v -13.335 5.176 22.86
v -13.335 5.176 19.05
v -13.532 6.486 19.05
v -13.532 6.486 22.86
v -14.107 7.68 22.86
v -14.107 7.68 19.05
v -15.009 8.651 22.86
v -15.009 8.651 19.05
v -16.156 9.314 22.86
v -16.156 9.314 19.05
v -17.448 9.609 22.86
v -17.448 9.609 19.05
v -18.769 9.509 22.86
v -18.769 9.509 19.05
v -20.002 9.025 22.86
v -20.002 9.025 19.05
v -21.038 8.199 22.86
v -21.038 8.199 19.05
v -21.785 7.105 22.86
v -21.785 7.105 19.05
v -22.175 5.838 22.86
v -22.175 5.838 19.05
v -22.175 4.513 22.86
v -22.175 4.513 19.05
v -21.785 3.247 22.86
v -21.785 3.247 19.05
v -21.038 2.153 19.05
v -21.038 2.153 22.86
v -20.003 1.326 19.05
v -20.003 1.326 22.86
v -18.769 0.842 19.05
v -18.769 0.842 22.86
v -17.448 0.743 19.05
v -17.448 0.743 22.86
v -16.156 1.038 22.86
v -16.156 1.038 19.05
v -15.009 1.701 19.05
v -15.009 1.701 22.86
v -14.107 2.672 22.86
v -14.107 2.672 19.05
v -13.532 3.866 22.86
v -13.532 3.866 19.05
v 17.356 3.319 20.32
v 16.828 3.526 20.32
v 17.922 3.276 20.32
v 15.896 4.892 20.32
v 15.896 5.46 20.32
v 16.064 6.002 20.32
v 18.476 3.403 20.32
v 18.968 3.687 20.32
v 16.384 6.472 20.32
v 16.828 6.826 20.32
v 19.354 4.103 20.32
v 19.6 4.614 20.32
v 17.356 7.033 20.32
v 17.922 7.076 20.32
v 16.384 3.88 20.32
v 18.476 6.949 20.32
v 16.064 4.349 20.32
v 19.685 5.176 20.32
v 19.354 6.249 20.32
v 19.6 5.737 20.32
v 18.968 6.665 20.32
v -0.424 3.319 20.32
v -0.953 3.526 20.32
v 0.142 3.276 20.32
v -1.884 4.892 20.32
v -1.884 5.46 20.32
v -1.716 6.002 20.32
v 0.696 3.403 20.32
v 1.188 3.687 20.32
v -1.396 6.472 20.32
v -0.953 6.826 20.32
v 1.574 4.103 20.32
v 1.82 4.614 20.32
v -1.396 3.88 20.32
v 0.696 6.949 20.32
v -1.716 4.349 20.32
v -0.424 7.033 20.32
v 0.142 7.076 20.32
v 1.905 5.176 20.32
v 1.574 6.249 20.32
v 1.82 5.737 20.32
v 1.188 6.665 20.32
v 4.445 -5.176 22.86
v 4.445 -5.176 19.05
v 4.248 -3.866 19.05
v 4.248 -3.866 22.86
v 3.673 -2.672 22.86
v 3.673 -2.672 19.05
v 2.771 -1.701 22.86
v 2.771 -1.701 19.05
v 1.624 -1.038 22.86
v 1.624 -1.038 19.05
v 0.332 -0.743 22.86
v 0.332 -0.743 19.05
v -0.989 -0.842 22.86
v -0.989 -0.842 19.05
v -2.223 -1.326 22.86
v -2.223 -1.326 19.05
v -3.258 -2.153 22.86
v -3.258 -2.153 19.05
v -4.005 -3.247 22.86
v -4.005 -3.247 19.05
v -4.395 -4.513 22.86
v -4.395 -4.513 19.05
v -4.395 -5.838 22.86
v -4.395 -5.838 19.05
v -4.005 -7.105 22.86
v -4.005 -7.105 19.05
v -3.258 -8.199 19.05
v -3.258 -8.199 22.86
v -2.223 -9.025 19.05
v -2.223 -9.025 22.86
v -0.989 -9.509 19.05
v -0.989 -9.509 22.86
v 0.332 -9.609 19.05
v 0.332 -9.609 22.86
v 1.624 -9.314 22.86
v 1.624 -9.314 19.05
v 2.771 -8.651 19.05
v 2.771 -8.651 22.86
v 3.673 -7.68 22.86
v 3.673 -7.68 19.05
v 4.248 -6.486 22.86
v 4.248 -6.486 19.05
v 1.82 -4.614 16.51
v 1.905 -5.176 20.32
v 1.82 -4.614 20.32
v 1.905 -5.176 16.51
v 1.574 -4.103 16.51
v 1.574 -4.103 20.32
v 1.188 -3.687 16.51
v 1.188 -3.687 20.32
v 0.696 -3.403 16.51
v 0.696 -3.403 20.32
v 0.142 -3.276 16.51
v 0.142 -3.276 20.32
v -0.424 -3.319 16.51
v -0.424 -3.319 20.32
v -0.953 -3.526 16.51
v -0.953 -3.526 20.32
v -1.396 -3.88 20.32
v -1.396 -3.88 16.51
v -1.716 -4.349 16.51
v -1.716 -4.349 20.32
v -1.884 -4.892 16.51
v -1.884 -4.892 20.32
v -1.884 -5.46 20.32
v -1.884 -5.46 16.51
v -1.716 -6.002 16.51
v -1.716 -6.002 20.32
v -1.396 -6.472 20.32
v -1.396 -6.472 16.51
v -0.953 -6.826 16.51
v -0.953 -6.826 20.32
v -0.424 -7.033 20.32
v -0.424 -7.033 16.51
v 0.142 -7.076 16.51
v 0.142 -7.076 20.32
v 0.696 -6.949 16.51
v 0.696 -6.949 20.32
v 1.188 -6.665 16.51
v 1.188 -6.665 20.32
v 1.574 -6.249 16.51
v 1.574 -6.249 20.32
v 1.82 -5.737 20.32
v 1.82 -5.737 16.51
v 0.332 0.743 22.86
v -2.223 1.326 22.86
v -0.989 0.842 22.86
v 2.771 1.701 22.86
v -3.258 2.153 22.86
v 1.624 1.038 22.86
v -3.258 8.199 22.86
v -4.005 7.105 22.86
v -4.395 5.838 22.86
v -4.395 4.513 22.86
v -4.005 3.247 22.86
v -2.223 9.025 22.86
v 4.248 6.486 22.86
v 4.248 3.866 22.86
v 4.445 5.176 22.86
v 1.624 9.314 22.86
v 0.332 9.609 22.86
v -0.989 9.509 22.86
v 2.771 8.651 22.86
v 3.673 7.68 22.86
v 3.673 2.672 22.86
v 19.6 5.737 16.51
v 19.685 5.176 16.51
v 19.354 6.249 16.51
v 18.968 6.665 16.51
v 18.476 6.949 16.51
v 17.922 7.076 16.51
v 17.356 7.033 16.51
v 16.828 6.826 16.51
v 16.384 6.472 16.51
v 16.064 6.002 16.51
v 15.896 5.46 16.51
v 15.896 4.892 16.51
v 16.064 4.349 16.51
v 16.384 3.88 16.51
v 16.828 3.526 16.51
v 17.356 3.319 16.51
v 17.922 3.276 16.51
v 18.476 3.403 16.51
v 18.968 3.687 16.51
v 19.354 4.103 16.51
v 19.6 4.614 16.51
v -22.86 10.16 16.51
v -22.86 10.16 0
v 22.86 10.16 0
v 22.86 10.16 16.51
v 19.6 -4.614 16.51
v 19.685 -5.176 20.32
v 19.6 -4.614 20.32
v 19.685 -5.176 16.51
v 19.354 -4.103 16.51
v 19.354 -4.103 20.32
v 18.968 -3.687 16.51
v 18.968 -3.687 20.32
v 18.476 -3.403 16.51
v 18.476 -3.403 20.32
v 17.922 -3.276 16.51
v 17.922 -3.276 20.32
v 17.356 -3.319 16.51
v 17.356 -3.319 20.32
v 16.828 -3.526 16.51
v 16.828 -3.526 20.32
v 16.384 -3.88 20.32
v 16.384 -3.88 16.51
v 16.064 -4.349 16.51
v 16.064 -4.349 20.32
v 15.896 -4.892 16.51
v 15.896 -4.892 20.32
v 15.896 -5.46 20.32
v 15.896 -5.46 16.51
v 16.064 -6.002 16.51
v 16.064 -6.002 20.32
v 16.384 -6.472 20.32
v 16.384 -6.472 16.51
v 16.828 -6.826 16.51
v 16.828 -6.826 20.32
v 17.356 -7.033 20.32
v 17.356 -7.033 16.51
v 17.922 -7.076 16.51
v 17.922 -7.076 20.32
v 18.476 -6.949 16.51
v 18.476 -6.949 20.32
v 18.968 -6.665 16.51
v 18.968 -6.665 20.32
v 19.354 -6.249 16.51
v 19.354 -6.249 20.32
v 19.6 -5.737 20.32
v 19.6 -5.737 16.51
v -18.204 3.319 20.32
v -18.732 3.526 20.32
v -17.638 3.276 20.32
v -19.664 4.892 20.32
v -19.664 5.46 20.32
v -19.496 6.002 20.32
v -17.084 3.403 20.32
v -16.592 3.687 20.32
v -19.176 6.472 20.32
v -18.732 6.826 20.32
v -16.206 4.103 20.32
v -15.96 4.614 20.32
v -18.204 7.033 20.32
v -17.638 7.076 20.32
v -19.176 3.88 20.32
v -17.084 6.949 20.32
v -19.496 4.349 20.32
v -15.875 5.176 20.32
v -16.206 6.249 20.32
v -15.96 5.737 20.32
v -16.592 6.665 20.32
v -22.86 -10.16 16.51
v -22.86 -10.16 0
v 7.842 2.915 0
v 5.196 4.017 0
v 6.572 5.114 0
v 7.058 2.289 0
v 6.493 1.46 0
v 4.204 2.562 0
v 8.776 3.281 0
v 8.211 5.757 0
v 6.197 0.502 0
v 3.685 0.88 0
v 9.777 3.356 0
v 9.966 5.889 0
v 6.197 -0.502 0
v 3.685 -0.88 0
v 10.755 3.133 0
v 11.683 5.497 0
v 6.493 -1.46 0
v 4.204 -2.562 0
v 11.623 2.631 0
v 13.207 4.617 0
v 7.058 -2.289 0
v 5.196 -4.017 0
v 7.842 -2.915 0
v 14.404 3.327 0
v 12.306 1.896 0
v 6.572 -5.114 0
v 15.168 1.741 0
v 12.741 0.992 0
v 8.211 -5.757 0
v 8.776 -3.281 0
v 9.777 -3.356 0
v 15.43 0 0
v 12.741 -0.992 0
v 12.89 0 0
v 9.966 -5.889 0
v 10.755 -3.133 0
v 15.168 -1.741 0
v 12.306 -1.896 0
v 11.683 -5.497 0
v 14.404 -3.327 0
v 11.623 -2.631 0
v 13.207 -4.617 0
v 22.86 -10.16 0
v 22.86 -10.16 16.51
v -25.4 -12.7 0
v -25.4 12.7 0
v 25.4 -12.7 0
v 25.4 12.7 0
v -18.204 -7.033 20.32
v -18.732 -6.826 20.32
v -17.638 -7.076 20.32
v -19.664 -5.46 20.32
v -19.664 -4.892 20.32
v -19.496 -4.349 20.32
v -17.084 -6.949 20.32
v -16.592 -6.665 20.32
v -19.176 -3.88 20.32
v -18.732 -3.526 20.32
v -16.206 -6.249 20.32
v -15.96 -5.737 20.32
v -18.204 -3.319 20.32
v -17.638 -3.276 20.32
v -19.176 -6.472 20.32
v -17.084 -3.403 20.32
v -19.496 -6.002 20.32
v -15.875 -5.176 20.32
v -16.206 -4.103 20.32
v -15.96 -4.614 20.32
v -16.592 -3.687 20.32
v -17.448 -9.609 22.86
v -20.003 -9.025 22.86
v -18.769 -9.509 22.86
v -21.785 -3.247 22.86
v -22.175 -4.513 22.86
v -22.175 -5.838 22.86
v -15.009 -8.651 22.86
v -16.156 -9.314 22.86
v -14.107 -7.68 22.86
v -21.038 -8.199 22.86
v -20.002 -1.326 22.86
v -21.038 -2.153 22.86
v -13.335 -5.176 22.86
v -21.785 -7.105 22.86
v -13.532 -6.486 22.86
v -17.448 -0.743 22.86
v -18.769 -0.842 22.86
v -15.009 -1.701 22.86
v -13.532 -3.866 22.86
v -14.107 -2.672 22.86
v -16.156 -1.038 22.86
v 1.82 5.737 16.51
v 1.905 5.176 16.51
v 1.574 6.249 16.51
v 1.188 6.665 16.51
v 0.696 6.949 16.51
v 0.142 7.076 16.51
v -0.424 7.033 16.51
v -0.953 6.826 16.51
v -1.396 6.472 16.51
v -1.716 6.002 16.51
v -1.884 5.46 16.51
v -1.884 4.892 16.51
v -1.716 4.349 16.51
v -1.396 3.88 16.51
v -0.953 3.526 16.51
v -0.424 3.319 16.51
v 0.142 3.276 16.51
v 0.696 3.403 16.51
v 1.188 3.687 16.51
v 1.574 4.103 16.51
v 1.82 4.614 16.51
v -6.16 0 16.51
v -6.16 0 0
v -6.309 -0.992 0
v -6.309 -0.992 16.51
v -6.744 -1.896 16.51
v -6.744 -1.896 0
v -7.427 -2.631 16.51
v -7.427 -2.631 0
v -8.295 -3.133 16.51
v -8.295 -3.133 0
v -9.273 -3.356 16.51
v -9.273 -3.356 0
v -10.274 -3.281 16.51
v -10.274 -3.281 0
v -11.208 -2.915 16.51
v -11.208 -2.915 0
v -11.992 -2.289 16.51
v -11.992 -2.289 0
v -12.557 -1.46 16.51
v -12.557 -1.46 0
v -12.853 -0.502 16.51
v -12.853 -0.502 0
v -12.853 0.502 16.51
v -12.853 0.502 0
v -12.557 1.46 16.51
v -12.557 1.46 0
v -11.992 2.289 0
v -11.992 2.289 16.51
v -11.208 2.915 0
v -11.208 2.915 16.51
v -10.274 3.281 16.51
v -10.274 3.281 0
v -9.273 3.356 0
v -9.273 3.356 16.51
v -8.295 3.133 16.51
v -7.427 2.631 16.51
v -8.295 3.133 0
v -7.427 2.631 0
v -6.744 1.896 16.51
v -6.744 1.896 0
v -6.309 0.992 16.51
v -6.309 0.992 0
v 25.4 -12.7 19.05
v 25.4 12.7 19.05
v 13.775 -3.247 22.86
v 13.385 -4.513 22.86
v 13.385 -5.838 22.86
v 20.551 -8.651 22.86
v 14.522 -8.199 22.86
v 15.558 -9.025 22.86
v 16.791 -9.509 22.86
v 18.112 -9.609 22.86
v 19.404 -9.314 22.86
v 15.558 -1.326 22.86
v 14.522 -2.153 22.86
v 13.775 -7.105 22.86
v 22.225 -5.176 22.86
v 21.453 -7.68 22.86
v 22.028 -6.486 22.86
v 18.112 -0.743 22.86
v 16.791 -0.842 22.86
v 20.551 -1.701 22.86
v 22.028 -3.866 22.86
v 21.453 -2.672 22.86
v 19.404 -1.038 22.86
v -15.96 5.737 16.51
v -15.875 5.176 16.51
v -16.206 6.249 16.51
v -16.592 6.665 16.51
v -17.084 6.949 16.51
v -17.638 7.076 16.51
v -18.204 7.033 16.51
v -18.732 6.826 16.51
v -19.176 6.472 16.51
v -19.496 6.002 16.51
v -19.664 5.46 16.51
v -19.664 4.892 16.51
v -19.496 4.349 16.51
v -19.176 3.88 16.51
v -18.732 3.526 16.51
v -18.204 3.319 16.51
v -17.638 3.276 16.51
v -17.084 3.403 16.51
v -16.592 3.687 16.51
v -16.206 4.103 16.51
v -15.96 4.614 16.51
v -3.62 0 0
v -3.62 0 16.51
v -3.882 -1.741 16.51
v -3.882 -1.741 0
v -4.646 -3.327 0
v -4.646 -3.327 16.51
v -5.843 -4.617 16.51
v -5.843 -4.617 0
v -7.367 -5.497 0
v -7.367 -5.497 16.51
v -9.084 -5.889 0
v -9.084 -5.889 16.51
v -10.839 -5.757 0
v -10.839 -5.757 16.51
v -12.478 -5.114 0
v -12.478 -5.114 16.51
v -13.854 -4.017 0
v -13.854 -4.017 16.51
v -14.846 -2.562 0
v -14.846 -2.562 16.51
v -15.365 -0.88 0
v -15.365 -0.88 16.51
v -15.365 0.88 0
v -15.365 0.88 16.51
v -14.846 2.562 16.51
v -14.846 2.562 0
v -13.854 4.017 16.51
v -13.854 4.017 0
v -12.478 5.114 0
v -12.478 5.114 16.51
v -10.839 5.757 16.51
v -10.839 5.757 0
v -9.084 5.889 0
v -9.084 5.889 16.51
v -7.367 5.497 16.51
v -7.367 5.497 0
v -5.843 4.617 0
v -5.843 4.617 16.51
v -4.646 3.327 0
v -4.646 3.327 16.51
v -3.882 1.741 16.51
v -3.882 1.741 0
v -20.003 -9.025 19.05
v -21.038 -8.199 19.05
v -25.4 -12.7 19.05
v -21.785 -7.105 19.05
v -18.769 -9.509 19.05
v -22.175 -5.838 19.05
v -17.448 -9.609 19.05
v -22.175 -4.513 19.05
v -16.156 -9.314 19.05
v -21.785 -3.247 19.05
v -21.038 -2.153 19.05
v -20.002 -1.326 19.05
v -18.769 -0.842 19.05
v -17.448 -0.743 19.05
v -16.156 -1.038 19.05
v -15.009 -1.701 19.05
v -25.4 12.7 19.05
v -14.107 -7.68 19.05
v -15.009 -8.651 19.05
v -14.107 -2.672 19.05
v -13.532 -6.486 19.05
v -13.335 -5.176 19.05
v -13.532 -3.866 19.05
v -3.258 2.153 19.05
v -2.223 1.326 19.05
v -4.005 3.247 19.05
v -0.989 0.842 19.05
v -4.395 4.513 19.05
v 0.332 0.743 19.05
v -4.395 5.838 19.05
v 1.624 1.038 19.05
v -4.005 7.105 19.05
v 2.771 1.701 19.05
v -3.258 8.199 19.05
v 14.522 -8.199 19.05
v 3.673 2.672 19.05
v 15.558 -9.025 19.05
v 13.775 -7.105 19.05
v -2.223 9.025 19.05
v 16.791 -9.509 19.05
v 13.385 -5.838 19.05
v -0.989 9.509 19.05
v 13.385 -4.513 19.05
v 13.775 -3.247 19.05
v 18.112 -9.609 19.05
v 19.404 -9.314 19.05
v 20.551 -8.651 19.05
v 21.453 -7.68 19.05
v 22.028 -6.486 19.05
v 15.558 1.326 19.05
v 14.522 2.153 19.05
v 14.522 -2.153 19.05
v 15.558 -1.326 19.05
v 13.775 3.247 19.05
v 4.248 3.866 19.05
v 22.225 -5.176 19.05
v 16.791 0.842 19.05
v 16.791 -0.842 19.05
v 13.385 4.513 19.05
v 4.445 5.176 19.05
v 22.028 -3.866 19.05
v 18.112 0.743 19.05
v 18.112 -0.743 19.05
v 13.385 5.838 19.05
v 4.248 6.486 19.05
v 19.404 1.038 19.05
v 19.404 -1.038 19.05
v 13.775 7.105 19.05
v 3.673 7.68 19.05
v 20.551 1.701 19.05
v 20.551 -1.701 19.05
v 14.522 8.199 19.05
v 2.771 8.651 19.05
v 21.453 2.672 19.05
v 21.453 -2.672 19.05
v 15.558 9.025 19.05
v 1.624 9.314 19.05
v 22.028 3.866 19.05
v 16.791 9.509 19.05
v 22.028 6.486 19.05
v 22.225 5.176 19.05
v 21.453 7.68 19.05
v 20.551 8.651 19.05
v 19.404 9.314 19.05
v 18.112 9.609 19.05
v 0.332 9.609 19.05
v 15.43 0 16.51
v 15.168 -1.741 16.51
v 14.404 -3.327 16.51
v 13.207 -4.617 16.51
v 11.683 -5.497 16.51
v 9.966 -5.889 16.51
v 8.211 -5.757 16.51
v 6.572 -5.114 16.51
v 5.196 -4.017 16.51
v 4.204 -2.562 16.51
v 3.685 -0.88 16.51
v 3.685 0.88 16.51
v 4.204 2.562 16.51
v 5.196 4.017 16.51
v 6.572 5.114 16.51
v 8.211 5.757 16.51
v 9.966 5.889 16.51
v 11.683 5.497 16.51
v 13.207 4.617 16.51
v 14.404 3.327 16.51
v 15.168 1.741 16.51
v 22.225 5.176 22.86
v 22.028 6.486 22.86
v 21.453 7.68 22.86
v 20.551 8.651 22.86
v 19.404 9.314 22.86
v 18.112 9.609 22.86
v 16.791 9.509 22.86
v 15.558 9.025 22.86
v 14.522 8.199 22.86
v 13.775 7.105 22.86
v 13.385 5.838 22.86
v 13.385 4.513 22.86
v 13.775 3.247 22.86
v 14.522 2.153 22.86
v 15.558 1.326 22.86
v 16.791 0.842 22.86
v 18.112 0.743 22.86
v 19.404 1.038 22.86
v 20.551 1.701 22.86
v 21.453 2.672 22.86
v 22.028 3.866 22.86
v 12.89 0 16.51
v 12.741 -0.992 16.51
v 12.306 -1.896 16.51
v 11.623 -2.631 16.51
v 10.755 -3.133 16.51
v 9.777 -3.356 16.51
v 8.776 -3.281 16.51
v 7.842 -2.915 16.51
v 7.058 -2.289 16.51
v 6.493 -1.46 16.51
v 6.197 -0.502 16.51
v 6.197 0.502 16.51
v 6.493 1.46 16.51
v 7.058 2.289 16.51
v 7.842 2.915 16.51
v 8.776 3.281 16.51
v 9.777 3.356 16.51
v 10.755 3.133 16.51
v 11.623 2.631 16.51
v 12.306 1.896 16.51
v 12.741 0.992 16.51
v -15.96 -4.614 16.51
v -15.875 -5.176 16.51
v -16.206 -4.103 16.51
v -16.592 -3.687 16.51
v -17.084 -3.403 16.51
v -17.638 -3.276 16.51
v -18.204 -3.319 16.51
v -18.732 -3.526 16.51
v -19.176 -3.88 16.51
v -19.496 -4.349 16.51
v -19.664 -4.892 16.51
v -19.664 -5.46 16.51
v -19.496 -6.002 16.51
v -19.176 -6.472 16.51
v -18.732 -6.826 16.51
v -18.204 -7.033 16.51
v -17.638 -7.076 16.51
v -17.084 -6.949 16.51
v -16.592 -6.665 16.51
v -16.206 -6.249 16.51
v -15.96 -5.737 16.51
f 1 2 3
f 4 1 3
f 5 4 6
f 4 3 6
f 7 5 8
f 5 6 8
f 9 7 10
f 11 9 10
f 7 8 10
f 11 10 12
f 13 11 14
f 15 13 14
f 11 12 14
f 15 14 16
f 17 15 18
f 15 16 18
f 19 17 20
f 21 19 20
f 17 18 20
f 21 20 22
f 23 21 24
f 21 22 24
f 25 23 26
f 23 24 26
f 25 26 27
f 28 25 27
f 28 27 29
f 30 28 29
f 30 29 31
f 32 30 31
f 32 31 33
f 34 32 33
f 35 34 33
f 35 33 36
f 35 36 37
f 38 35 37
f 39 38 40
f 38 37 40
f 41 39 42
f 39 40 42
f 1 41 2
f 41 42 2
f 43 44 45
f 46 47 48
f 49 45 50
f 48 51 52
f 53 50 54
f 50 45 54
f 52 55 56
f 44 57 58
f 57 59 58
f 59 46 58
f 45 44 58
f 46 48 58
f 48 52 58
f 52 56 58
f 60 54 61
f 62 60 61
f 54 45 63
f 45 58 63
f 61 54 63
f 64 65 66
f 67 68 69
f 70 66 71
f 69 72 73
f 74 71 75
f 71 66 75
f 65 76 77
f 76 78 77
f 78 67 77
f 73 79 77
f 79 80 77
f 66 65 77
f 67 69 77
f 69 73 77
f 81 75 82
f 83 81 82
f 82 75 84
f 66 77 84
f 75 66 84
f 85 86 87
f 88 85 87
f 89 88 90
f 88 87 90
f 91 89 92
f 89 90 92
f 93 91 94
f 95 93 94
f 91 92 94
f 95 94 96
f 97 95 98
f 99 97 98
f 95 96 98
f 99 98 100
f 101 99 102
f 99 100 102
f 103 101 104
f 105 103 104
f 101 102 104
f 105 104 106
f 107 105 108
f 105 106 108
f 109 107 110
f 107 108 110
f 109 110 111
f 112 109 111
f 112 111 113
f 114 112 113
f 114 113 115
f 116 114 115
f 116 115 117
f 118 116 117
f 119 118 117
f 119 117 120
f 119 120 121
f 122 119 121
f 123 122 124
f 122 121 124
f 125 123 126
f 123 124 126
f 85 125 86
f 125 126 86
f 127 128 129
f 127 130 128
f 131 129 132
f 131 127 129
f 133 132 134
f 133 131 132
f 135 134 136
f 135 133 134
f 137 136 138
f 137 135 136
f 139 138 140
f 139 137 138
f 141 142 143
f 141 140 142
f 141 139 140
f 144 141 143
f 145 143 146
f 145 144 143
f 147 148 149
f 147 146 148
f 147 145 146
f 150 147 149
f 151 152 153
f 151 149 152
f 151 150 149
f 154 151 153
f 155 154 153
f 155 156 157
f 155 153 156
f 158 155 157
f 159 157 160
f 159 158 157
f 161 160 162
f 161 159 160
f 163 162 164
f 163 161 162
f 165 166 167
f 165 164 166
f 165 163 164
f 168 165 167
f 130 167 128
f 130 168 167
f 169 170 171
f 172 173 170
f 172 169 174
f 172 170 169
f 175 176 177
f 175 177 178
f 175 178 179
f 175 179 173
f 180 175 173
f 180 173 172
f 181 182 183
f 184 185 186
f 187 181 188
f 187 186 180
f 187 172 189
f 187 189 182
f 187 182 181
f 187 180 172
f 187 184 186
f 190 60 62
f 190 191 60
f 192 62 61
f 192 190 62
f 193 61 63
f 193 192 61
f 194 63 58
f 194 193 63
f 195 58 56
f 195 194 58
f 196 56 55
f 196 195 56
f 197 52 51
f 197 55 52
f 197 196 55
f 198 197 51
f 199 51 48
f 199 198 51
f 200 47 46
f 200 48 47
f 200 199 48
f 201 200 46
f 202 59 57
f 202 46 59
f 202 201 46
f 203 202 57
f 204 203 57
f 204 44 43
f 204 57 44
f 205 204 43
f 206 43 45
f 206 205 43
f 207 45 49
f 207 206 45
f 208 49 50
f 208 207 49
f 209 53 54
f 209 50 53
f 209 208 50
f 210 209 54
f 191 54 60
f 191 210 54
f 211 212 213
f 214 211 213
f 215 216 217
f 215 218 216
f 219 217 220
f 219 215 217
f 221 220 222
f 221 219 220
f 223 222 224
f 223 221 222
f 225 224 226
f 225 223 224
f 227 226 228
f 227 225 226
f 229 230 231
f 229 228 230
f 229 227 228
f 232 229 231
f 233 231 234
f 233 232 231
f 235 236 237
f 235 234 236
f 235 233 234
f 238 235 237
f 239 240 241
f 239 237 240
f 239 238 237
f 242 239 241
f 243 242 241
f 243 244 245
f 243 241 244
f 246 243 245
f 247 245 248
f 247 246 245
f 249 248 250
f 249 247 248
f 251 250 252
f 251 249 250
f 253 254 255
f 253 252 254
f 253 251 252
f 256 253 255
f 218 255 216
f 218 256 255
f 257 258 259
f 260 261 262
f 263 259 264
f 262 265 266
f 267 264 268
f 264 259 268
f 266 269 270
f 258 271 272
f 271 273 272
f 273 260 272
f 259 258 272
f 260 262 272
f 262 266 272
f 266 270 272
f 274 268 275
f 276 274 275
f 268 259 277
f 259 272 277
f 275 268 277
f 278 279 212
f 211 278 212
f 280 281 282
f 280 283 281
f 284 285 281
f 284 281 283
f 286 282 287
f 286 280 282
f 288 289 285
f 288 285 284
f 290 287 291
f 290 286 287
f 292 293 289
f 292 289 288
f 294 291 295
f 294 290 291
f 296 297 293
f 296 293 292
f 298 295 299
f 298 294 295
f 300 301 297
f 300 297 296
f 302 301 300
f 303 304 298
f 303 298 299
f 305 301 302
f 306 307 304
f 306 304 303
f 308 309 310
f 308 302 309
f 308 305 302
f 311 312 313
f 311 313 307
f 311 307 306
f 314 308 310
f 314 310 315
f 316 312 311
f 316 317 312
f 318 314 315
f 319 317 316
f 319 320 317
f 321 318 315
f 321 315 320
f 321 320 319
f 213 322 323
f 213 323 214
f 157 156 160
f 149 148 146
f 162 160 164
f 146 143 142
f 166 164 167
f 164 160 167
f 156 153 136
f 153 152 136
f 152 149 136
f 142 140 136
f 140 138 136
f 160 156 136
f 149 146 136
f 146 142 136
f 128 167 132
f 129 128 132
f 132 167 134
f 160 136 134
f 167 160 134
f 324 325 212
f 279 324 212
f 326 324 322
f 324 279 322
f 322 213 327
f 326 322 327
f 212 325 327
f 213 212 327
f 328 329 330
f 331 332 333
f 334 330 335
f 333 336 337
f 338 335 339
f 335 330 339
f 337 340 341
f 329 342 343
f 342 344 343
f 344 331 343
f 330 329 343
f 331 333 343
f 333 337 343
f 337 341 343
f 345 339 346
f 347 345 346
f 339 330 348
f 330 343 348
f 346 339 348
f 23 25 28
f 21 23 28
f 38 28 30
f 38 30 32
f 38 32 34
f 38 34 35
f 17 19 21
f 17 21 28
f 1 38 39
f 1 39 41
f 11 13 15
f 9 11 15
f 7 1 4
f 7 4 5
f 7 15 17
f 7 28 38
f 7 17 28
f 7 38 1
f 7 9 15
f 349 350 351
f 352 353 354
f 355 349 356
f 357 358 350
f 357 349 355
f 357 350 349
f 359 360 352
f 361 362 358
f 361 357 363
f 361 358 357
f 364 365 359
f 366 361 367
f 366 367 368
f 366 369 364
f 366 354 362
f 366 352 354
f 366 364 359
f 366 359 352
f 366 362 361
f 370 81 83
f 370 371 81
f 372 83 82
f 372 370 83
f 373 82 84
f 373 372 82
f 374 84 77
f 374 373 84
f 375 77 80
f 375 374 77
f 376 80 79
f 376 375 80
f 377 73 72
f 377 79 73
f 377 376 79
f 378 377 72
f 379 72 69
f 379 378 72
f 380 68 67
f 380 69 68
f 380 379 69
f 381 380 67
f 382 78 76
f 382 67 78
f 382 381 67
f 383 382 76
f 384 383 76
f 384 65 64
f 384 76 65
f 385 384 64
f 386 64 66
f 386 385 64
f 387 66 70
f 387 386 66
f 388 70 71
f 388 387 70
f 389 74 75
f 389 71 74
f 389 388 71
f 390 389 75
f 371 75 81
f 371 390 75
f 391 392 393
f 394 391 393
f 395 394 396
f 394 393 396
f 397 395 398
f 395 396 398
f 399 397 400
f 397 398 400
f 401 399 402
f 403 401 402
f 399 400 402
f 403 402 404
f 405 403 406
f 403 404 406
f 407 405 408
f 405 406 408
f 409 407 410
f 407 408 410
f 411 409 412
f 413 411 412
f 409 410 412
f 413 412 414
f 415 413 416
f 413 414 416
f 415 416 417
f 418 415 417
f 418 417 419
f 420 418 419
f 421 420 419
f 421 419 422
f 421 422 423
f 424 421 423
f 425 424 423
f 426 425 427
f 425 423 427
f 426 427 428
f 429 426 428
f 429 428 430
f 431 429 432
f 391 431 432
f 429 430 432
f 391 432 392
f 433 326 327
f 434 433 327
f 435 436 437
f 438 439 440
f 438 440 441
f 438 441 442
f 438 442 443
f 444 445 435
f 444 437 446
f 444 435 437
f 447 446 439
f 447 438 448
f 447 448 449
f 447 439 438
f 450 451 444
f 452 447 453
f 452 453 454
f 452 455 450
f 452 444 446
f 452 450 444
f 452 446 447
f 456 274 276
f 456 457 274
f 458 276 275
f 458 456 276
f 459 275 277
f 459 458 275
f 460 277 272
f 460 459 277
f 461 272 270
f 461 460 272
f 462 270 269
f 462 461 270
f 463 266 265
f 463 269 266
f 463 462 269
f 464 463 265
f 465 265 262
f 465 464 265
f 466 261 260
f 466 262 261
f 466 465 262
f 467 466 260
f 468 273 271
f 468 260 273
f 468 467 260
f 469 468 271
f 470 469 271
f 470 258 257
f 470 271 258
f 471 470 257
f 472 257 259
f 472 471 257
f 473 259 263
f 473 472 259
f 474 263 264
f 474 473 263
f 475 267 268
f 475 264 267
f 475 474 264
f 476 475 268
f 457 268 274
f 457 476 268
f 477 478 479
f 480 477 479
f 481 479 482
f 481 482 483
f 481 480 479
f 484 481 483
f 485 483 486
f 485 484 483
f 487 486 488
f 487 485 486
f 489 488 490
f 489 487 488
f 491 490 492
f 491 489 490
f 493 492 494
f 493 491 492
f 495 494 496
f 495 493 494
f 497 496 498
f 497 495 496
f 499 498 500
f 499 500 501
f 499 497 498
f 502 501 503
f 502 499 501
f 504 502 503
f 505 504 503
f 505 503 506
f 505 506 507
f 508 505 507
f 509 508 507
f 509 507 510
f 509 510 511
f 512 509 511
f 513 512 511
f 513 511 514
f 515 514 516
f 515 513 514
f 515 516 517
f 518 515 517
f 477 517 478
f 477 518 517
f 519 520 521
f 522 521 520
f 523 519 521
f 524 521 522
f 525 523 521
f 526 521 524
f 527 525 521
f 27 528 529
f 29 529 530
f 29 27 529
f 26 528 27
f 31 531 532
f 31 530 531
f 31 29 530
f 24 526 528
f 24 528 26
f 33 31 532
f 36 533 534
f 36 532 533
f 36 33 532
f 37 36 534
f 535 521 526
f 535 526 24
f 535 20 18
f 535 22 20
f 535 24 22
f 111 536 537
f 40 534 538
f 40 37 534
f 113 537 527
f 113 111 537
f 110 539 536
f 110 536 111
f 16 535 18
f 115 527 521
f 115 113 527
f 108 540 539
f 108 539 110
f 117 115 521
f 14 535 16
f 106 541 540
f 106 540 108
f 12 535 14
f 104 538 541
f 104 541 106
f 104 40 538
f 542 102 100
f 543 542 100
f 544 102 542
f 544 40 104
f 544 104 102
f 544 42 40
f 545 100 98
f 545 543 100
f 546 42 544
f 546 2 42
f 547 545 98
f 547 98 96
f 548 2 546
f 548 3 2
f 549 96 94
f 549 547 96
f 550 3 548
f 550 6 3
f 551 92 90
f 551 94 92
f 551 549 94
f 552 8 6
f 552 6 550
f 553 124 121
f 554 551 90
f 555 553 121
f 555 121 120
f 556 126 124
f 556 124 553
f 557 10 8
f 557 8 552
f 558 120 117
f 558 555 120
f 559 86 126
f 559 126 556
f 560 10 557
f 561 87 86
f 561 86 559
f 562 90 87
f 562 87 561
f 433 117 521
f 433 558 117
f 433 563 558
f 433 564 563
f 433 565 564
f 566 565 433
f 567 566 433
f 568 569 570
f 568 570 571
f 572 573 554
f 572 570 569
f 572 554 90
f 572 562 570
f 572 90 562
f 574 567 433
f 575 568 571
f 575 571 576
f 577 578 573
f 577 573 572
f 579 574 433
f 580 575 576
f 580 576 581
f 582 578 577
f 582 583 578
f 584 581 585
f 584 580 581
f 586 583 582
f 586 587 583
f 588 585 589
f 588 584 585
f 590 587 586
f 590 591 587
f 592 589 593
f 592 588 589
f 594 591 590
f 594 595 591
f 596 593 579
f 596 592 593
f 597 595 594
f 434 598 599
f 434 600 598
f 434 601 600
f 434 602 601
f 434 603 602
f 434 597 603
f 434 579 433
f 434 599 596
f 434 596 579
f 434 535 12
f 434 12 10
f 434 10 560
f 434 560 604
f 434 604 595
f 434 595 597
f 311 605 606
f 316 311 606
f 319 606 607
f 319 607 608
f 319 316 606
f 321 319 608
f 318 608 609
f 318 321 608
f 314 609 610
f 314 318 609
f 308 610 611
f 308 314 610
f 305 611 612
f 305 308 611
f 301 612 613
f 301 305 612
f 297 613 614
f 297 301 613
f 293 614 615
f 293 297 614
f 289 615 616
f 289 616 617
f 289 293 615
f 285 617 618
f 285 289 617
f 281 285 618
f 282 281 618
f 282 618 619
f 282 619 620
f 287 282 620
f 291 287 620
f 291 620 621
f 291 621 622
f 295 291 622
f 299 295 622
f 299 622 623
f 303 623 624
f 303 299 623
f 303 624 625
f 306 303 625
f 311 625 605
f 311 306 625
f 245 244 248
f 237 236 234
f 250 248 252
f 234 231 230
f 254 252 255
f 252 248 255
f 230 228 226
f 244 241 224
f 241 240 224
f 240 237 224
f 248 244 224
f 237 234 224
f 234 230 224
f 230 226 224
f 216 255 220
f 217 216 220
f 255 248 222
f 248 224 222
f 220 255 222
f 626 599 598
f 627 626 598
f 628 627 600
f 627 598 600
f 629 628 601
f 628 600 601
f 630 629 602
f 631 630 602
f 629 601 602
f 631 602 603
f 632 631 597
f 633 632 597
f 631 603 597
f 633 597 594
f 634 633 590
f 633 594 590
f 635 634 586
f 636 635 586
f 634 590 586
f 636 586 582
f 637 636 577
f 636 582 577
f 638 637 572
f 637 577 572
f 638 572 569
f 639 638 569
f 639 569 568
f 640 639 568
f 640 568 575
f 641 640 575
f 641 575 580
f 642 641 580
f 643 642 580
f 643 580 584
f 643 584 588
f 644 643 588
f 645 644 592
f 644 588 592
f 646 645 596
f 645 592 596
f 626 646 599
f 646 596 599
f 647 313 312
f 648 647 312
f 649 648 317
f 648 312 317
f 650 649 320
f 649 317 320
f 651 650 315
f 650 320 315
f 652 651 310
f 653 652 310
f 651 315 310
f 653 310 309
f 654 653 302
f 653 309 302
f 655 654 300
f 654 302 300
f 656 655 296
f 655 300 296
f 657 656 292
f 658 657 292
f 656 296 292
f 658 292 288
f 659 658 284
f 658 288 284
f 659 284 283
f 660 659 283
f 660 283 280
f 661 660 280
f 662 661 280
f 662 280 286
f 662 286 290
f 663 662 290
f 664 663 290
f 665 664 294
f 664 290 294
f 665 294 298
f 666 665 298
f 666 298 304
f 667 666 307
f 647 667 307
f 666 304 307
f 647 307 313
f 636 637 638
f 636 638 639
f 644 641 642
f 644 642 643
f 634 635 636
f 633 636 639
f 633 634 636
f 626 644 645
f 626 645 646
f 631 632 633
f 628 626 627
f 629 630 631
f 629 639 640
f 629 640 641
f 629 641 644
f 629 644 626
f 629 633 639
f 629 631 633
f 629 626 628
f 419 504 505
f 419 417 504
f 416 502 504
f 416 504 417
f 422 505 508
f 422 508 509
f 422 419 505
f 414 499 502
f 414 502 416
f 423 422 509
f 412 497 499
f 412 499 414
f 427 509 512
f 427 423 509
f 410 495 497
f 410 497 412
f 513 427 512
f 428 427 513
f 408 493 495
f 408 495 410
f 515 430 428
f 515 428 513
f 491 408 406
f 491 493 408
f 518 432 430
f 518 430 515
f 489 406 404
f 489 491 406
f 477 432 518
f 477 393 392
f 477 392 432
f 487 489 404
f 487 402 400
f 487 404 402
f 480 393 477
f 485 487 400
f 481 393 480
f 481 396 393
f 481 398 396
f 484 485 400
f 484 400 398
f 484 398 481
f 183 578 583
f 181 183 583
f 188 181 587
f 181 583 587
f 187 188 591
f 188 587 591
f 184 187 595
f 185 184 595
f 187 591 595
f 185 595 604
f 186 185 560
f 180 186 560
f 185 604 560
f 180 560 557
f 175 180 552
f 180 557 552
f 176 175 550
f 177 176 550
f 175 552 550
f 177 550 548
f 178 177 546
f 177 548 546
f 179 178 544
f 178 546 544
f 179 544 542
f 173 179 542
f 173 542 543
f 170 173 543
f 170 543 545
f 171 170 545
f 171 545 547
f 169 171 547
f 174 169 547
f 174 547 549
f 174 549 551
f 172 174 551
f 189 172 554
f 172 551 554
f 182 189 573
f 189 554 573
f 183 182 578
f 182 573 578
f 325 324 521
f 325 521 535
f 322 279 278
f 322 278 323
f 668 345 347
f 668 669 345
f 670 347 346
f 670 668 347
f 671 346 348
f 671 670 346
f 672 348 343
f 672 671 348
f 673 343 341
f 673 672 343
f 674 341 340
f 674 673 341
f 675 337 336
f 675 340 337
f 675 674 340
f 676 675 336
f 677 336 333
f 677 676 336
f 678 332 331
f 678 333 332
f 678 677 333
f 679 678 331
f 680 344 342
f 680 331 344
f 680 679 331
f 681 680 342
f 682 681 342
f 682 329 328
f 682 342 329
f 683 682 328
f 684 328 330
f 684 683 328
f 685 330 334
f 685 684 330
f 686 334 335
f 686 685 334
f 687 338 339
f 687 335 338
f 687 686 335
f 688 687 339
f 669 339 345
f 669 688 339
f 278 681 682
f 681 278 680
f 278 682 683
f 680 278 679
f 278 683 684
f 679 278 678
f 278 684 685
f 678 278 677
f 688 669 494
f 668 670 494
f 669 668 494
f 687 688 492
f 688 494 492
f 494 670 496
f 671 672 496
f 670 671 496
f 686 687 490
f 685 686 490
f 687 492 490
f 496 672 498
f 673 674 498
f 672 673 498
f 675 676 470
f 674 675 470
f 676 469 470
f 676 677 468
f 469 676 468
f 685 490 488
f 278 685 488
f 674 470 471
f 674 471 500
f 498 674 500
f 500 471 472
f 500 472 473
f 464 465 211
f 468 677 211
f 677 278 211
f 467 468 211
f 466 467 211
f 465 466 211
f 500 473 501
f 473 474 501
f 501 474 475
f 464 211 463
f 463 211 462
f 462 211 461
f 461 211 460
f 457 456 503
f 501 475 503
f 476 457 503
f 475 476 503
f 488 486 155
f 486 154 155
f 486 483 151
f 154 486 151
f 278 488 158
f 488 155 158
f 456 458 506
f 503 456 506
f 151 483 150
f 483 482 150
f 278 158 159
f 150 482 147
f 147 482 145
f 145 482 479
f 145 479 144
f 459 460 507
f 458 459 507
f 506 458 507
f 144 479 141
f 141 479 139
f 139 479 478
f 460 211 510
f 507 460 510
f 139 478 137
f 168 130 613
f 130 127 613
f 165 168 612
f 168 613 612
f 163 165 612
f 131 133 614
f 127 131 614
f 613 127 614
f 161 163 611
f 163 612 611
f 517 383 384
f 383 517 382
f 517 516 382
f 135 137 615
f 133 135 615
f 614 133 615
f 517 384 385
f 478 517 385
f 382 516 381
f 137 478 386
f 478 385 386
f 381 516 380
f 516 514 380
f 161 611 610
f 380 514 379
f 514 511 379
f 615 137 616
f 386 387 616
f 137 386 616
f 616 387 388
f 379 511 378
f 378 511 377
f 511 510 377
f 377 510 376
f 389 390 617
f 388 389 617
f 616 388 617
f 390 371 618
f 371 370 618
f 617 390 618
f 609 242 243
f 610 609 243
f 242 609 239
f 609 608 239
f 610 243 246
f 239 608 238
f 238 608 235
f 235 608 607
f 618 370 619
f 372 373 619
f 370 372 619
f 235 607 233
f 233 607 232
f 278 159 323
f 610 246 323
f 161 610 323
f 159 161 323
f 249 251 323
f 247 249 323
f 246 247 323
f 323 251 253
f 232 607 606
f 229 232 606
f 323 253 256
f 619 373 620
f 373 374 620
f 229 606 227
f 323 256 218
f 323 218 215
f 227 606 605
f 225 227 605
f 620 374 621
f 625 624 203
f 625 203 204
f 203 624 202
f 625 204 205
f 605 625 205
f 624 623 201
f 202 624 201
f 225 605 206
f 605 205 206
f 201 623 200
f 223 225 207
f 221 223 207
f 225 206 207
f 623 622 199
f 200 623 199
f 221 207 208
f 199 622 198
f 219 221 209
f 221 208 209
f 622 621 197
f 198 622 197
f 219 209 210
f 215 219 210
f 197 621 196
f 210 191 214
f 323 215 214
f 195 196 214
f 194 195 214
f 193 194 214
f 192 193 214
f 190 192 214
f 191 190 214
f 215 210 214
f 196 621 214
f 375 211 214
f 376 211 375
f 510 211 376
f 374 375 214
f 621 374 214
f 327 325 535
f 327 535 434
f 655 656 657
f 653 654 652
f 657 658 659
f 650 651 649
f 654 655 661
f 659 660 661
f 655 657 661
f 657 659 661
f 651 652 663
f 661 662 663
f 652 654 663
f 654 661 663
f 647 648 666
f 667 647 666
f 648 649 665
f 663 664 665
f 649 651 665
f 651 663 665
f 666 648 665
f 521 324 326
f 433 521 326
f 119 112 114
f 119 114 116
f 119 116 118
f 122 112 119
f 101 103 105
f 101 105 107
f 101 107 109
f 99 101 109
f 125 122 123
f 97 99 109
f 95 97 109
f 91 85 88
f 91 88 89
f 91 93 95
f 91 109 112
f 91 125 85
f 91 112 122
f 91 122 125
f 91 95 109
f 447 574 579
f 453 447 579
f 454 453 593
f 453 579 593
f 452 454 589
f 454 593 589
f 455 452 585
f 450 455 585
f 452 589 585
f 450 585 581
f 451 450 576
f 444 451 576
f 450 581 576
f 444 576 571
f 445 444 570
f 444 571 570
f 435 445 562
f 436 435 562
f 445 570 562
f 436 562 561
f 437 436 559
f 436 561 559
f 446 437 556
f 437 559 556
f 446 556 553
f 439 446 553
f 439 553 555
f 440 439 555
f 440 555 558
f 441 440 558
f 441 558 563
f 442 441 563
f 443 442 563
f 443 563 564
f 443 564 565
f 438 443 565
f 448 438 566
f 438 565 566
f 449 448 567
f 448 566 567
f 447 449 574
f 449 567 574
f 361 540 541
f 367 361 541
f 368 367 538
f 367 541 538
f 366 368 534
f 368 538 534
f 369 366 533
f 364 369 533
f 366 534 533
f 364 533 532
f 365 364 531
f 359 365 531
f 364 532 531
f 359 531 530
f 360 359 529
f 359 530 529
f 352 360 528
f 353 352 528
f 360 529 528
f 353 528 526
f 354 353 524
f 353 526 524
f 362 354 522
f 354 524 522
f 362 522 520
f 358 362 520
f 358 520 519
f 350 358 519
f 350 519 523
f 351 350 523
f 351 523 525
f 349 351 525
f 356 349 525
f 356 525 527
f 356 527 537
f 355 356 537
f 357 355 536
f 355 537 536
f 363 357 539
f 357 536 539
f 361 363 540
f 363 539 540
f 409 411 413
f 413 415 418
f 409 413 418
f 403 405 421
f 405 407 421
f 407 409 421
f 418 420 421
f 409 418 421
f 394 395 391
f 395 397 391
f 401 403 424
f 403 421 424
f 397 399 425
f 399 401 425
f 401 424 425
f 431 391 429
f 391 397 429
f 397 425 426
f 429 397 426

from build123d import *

# Parameters (mm, degrees)
F0_W     = 50.8
F0_H     = 25.4
F1_DEPTH = 19.05
F2_R     = 4.445
F3_DEPTH = 3.81
F4_T     = -2.54
F5_R     = 5.9055
F5_R_2   = 3.3655
F6_DEPTH = 16.51


with BuildPart() as f1:
    # F0 (on Top) → F1 (new body)
    with BuildSketch(Plane.XY):
        Rectangle(F0_W, F0_H)
    extrude(amount=F1_DEPTH)

    # F2 (on face) → F3 (join)
    with BuildSketch(Plane.XY.offset(19.05)):
        with Locations((-17.78, 5.1759317036)):
            Circle(F2_R)
        with Locations((0, 5.1759317036)):
            Circle(F2_R)
        with Locations((17.78, 5.1759317036)):
            Circle(F2_R)
        with Locations((17.78, -5.1759317036)):
            Circle(F2_R)
        with Locations((0, -5.1759317036)):
            Circle(F2_R)
        with Locations((-17.78, -5.1759317036)):
            Circle(F2_R)
    extrude(amount=F3_DEPTH)

    # F4
    f4_openings = [f1.faces().sort_by_distance(p)[0] for p in [
        (0, 0, 0),
    ]]
    offset(amount=F4_T, openings=f4_openings, kind=Kind.INTERSECTION)

    # F5 (on face) → F6 (join, through all)
    with BuildSketch(Plane(origin=(0, 0, 0), x_dir=(1, 0, 0), z_dir=(0, 0, -1))):
        with Locations((-9.525, 0)):
            Circle(F5_R)
        with Locations((-9.525, 0)):
            Circle(F5_R_2, mode=Mode.SUBTRACT)
        with Locations((9.525, 0)):
            Circle(F5_R)
        with Locations((9.525, 0)):
            Circle(F5_R_2, mode=Mode.SUBTRACT)
    extrude(amount=-F6_DEPTH)


solid = f1.part
